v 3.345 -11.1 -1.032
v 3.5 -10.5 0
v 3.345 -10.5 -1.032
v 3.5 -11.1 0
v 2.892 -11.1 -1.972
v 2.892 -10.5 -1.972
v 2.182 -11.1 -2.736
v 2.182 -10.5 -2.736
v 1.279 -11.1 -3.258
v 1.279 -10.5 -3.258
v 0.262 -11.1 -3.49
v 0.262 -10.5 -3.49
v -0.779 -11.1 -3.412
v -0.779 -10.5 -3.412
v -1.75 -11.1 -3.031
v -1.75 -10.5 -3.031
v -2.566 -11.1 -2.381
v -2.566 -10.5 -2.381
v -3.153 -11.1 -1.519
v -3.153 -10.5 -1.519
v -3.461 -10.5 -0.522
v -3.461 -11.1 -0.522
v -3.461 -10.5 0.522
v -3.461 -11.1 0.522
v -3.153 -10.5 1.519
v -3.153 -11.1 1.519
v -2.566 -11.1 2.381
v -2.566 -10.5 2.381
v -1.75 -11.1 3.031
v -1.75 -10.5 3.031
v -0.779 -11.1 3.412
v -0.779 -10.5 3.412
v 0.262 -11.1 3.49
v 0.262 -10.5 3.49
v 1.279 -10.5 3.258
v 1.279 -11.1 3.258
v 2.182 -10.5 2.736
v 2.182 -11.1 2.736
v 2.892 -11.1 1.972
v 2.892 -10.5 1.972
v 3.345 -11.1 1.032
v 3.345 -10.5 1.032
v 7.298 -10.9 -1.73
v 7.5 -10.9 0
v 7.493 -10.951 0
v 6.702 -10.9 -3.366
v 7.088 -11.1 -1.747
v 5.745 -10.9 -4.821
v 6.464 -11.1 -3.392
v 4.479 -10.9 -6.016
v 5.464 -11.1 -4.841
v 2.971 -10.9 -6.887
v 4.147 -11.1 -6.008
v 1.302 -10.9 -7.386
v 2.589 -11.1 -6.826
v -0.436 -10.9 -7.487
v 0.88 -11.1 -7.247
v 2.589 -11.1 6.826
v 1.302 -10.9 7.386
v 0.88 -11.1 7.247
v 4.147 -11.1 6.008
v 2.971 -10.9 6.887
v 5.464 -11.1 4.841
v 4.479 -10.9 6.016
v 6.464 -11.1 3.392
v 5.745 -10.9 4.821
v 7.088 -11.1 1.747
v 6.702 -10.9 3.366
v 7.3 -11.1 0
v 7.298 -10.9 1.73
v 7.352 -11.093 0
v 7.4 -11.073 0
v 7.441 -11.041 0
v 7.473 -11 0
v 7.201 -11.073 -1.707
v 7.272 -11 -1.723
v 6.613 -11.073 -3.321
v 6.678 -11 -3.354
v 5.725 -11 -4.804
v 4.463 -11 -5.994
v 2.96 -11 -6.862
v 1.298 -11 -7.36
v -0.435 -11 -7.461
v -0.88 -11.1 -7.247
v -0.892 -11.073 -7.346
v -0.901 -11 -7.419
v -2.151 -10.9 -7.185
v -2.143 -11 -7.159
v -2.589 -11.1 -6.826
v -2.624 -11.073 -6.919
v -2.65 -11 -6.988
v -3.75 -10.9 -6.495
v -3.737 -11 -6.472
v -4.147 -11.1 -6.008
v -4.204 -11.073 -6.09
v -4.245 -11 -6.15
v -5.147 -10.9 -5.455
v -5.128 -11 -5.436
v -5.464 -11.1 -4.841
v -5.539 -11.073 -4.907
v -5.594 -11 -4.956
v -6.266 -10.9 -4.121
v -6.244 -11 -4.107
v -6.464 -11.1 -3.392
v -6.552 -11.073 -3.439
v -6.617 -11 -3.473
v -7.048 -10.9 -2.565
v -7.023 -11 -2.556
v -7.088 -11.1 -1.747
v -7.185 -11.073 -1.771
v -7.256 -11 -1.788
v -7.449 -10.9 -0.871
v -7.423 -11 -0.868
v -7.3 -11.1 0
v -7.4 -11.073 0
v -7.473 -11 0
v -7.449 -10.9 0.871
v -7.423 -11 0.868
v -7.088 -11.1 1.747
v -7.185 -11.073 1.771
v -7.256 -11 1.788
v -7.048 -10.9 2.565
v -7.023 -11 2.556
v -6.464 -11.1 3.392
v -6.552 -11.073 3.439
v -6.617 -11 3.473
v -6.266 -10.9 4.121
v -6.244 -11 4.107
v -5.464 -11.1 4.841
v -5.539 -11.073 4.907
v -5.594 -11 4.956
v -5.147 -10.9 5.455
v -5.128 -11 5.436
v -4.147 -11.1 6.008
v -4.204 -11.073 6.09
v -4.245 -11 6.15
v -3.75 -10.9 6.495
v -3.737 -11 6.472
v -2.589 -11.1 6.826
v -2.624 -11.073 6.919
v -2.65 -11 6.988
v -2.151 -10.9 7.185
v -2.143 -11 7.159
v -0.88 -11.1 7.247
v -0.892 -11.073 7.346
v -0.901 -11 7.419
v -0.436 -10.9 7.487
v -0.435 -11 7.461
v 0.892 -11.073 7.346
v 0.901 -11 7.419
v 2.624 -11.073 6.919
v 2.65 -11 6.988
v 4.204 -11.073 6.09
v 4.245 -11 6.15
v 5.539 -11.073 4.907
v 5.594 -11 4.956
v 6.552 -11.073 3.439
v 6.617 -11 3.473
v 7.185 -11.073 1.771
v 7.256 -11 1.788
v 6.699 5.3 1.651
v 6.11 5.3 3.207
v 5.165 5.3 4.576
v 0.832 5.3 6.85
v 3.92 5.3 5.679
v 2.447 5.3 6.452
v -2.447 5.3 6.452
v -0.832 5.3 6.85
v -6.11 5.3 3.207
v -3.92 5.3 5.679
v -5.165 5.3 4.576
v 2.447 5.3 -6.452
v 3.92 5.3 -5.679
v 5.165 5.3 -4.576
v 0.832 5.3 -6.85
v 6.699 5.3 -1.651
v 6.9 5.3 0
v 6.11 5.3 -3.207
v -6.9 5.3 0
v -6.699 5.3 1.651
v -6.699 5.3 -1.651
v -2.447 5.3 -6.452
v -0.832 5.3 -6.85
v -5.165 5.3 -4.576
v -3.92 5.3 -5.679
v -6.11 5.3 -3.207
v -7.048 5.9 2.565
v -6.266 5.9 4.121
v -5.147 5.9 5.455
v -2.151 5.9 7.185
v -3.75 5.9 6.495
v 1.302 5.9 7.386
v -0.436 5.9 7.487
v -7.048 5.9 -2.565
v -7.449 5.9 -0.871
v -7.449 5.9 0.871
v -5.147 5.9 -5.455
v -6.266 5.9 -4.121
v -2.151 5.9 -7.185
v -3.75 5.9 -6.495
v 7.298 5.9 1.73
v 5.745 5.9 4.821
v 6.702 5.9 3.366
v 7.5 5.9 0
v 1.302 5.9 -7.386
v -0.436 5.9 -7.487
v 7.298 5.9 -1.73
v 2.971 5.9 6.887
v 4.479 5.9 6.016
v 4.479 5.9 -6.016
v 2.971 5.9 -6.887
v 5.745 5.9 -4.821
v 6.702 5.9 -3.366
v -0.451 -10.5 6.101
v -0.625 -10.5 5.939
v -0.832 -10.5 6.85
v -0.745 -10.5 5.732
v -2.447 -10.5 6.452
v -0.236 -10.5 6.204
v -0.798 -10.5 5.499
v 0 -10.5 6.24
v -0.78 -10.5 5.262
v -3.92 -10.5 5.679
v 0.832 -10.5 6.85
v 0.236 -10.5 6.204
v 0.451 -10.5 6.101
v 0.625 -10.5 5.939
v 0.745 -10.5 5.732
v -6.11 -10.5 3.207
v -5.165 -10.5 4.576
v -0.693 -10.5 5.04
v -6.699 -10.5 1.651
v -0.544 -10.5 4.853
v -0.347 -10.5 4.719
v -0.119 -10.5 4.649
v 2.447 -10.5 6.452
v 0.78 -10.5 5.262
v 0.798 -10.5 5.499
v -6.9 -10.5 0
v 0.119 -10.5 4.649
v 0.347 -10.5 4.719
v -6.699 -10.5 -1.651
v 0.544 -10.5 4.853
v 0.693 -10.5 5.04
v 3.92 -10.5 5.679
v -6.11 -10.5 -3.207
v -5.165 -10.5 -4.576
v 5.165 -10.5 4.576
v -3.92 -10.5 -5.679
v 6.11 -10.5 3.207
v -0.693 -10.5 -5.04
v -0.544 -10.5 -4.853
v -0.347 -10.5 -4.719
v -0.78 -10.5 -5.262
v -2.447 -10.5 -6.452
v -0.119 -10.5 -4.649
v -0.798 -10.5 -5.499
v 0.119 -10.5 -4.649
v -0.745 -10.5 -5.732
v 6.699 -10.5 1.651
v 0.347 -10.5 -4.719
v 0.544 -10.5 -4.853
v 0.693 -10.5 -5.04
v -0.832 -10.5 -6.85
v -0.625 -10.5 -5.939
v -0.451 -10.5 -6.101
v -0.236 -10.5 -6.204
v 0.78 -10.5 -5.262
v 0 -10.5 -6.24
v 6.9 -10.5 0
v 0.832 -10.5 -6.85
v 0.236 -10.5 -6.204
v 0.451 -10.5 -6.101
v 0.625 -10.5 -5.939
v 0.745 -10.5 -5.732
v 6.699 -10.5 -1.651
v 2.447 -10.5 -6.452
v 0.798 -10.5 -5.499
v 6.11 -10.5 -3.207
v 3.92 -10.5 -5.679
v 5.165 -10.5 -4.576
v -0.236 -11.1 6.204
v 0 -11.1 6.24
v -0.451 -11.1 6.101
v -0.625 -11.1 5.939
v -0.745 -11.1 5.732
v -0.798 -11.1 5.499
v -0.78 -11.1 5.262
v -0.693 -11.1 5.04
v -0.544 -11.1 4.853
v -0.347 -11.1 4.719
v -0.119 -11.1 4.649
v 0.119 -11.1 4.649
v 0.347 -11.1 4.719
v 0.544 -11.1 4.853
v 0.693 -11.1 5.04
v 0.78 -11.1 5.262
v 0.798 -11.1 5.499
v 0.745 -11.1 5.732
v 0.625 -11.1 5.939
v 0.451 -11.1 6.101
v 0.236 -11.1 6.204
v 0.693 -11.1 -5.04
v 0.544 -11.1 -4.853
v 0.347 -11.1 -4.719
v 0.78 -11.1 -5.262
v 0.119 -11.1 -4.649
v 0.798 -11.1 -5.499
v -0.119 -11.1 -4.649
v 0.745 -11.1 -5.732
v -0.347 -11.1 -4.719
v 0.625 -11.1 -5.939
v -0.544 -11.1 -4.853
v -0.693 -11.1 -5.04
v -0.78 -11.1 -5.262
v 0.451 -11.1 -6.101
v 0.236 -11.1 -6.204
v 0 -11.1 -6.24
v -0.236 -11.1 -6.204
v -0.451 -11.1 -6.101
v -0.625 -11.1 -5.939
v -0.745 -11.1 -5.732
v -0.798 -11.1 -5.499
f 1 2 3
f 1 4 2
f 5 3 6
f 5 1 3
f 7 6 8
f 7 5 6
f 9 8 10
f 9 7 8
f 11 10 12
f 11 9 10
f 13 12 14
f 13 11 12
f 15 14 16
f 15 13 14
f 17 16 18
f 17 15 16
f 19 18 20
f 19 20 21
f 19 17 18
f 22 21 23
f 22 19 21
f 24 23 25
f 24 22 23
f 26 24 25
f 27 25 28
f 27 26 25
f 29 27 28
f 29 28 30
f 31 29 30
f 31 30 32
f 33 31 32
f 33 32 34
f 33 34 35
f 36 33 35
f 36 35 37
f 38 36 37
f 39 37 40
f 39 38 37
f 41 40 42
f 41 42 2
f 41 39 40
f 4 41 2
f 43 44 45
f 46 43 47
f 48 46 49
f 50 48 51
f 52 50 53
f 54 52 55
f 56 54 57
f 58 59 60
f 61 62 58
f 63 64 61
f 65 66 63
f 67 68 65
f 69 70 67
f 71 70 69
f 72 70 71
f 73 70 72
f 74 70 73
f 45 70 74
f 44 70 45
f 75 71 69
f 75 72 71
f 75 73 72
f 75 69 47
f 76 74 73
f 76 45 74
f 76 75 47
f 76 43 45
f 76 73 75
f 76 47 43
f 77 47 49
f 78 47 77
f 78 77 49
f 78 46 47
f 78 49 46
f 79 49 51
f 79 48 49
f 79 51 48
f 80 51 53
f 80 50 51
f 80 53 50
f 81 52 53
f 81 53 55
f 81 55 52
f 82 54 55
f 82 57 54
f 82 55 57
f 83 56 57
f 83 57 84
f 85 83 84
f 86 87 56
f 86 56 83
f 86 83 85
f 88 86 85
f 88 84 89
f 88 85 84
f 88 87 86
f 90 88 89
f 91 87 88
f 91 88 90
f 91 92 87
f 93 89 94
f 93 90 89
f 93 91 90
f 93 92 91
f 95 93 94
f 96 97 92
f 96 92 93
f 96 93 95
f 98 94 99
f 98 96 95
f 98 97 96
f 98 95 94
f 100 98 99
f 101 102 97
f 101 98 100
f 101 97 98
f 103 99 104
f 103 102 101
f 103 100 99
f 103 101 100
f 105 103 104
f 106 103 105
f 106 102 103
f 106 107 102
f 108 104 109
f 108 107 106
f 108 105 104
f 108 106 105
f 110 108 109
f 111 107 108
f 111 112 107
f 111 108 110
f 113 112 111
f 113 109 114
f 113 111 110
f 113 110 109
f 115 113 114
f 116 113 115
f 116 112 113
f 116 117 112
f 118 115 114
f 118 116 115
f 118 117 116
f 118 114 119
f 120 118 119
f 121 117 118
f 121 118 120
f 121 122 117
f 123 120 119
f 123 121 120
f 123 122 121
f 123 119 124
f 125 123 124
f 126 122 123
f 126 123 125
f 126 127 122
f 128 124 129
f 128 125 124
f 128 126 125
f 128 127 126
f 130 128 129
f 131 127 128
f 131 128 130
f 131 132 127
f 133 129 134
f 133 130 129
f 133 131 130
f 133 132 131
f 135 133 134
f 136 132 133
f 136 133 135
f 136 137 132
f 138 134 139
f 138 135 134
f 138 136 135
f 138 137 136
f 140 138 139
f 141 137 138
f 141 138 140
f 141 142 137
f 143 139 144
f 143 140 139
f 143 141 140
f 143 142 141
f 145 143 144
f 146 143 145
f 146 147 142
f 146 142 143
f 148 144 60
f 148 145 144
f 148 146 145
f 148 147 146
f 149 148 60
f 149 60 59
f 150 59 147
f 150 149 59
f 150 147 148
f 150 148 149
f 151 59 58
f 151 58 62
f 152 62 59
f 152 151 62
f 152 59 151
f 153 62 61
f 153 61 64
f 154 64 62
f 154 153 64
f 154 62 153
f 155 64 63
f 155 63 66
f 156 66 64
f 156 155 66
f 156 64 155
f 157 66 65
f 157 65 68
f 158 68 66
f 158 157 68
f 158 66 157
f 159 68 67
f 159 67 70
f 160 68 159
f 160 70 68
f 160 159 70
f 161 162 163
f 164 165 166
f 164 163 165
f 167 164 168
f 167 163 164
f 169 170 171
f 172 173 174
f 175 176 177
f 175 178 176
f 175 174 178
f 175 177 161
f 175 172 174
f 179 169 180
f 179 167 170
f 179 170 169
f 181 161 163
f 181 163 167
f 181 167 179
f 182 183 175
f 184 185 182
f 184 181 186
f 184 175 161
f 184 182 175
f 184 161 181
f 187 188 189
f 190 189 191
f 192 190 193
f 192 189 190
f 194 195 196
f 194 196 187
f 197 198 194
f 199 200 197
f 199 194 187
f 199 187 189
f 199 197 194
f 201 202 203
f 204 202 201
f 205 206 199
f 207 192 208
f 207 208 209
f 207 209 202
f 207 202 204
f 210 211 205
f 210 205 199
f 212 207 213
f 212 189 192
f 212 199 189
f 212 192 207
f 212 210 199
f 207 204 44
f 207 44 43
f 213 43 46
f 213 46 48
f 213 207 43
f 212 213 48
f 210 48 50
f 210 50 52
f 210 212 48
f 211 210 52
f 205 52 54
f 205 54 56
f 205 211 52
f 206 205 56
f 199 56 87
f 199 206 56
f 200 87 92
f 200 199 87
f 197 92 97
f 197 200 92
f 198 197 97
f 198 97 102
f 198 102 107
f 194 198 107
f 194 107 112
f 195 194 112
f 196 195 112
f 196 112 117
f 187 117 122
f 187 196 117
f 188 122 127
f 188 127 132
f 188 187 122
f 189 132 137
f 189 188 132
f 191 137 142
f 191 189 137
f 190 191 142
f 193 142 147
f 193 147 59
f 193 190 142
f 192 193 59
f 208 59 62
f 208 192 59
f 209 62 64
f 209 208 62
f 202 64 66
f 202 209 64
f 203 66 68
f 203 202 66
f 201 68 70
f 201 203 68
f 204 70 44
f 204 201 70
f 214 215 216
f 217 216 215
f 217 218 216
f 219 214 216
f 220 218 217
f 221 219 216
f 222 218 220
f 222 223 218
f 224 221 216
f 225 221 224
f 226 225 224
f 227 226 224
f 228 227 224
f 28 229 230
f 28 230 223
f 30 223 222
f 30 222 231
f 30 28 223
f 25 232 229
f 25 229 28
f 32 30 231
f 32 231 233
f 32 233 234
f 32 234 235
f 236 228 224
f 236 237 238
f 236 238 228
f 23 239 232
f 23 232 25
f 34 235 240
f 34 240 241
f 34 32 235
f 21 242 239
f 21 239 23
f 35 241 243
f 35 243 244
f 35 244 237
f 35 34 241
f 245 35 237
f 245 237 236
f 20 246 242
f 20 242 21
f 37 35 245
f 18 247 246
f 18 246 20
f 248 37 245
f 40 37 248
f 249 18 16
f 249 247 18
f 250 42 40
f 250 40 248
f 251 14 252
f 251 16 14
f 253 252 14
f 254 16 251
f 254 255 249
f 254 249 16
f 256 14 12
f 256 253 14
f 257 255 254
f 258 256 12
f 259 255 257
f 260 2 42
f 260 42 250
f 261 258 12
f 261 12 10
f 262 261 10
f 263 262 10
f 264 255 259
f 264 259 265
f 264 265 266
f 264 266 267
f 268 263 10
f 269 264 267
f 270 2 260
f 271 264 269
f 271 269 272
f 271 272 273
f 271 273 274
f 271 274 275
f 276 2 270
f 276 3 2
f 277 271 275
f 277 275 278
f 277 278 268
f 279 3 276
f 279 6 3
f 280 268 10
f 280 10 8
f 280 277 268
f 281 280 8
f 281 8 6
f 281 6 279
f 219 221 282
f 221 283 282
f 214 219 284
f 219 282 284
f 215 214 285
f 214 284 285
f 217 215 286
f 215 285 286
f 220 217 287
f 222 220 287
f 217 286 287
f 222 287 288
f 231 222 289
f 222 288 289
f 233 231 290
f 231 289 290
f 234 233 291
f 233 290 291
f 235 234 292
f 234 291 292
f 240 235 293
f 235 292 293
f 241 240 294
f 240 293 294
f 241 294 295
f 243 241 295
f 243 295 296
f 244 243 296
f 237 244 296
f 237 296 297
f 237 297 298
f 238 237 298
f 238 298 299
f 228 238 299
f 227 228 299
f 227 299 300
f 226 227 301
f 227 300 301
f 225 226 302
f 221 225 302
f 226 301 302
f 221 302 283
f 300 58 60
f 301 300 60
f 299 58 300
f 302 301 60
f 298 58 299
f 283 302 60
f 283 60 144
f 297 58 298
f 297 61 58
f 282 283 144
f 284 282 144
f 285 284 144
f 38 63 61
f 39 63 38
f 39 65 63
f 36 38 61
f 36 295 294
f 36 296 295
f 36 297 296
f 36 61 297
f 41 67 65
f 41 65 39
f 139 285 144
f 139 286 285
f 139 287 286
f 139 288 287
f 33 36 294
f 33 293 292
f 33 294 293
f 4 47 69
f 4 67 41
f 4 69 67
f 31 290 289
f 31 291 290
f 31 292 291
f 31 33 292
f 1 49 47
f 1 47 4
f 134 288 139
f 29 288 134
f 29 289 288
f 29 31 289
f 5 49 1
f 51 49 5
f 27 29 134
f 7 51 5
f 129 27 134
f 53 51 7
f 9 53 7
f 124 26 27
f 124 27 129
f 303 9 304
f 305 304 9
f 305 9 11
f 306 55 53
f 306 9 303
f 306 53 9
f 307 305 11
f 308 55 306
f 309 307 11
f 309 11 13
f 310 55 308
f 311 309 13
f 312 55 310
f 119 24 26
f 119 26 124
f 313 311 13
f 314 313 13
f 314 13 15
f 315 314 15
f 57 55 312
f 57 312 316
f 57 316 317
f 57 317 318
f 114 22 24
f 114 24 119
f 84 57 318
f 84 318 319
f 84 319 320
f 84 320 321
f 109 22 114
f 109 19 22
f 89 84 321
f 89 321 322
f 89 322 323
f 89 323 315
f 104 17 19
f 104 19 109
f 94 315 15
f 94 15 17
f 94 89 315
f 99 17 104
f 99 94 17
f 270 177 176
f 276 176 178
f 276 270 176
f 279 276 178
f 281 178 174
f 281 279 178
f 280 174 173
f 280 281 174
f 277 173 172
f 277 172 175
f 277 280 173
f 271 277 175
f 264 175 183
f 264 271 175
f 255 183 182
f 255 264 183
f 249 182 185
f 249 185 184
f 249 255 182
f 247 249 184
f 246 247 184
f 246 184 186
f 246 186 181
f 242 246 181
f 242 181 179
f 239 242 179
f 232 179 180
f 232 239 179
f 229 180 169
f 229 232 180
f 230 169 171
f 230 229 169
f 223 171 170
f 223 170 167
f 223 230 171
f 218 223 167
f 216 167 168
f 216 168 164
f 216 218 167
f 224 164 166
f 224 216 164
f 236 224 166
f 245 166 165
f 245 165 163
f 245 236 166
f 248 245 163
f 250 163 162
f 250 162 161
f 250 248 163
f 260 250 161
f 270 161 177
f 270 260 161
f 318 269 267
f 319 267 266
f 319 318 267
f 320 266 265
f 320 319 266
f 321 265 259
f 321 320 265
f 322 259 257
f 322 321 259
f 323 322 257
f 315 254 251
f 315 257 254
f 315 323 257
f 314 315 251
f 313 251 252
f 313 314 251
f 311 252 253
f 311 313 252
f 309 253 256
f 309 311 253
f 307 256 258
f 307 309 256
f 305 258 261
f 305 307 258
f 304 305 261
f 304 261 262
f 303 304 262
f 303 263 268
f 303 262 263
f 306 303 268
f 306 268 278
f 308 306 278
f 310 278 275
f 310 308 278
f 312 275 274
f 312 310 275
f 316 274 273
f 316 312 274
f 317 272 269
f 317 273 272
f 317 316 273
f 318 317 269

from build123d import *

# Parameters (mm, degrees)
FILLET_1_R = 0.2


with BuildPart() as part:
    # 草图1 → 旋转-薄壁1 (revolve)
    with BuildSketch(Plane.XY):
        Polygon((3.5, -11.099526066), (7.5, -11.099526066), (7.5, 5.900473934), (0, 5.900473934), (0, 5.300473934), (6.9, 5.300473934), (6.9, -10.499526066), (3.5, -10.499526066), align=None)
    revolve(axis=Axis((0, -19.840377492, 0), (0, 1, 0)))

    # 草图3 → M2 螺纹孔1 (revolve, cut)
    with BuildSketch(Plane(origin=(0, -11.099526066, -5.439713429), x_dir=(0, 0, -1), z_dir=(1, 0, 0))):
        Polygon((0, 0), (0, 2.480688495), (0.8, 2), (0.8, 0), align=None)
    hole_wizard_m2_1 = revolve(axis=Axis((0, -17.449526066, -5.439713429), (0, 1, 0)), mode=Mode.SUBTRACT)

    # 镜向1: M2 螺纹孔1 across plane
    add(hole_wizard_m2_1.mirror(Plane.XY), mode=Mode.SUBTRACT)

    # 圆角1
    fillet_1_edges = [part.edges().sort_by_distance(p)[0] for p in [
        (-7.5, -11.099526066, 0),
    ]]
    fillet(fillet_1_edges, radius=FILLET_1_R)


solid = part.part
